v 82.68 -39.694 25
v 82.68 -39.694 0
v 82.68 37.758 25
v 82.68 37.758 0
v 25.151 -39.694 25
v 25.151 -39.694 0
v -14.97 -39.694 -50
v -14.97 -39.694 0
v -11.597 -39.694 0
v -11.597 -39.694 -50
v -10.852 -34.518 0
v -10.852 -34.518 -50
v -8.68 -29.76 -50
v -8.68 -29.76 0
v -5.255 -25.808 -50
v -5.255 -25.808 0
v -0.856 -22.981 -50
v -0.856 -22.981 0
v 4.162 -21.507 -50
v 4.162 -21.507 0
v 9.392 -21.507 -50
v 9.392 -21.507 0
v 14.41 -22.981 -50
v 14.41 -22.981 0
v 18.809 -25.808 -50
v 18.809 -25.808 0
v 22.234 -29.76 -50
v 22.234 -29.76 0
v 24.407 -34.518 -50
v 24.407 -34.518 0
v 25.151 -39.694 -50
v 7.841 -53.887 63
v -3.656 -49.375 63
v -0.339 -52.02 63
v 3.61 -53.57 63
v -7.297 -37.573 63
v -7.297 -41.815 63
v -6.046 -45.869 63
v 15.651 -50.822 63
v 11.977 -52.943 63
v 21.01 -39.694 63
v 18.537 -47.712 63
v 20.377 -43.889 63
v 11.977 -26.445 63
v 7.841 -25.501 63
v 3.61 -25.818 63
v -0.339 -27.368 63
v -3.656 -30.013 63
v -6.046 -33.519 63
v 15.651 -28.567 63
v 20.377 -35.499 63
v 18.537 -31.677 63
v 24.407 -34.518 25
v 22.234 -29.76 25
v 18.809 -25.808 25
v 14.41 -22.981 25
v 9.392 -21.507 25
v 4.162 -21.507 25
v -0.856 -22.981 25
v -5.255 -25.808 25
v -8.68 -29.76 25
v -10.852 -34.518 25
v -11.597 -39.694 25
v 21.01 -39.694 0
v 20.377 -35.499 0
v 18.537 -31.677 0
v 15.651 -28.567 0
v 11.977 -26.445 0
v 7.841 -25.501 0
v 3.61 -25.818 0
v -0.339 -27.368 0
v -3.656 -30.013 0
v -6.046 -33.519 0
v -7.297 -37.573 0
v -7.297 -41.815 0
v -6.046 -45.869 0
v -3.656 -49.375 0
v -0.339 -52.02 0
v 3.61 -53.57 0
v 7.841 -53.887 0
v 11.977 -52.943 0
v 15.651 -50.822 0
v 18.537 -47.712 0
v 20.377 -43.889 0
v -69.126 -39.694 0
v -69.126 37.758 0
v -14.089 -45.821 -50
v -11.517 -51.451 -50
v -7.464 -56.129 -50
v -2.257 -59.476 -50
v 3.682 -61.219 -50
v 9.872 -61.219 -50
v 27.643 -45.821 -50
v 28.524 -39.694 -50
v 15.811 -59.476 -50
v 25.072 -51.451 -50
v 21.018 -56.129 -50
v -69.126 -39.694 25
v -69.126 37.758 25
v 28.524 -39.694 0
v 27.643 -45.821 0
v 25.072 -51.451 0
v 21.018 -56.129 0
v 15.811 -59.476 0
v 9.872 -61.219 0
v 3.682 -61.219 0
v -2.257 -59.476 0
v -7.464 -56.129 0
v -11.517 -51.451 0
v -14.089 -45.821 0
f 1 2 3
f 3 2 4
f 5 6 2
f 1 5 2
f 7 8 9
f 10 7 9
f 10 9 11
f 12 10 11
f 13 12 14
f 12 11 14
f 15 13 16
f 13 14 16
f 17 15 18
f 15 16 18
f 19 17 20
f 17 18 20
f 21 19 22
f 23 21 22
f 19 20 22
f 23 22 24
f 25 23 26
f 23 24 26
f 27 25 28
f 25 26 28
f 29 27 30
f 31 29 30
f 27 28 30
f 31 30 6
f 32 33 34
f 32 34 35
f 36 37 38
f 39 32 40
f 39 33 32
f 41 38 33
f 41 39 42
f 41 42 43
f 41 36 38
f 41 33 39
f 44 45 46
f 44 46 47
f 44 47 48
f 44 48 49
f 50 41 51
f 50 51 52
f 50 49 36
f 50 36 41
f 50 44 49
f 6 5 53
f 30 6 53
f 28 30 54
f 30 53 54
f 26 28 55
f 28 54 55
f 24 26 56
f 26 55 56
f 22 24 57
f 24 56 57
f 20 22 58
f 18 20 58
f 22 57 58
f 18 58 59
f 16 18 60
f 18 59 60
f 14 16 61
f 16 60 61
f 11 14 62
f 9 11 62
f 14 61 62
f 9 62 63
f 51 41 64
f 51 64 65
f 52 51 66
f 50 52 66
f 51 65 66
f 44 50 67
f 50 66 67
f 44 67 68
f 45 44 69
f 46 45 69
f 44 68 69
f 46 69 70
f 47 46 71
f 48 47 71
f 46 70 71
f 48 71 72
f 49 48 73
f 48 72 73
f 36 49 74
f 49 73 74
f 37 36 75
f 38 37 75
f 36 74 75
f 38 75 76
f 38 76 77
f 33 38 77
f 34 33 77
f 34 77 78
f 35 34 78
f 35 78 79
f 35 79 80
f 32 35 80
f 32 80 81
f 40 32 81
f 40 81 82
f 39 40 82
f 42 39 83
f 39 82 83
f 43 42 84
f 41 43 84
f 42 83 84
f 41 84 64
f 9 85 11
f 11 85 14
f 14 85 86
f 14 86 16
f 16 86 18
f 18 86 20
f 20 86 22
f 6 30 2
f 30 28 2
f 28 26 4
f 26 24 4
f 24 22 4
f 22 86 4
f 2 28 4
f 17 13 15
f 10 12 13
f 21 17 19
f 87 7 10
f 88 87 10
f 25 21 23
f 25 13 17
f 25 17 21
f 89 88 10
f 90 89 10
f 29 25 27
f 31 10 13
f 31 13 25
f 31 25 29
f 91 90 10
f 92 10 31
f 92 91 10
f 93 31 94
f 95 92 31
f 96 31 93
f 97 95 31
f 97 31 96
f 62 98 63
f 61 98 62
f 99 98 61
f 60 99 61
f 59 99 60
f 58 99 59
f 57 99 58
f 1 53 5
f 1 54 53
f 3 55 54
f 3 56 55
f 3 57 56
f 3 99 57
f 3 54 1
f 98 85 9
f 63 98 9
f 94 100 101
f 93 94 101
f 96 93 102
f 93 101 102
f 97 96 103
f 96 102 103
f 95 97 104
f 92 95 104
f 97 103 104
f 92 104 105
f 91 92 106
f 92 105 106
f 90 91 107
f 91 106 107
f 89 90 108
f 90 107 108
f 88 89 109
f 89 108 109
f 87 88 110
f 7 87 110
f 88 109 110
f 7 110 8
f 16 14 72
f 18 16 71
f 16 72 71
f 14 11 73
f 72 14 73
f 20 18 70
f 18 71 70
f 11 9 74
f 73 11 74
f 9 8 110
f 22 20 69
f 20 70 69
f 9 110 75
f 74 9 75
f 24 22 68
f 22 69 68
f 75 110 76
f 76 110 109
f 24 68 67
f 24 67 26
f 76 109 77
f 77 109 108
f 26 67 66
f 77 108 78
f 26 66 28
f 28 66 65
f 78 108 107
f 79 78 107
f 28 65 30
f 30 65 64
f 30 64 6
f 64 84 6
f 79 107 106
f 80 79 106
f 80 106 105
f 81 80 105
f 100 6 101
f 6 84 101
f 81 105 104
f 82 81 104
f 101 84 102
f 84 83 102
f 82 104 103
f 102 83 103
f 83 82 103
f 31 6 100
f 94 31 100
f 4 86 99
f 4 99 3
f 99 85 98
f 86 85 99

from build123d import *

# Parameters (mm, degrees)
F0_W     = 151.8057435751
F0_H     = 77.4519108236
F1_DEPTH = 25
F3_DEPTH = 25
F4_R     = 15.359977329
F5_DEPTH = 50
F6_R     = 14.2326136312
F7_DEPTH = 63


with BuildPart() as f1:
    # F0 (on Top) → F1 (new body)
    with BuildSketch(Plane.XY):
        with Locations((6.7770406604, -0.9681414813)):
            Rectangle(F0_W, F0_H)
    extrude(amount=F1_DEPTH)

    # F2 (on face) → F3 (cut)
    with BuildSketch(Plane.XY.offset(25)):
        with BuildLine():
            Line((-11.5967069719, -39.6940968931), (25.1507882926, -39.6940968931))
            ThreePointArc((25.1507882926, -39.6940968931), (6.7770406604, -21.3203492608), (-11.5967069719, -39.6940968931))
        make_face()
    extrude(amount=-F3_DEPTH, mode=Mode.SUBTRACT)


with BuildPart() as f5:
    # F4 (on face) → F5 (new body)
    with BuildSketch(Plane(origin=(0, 0, 0), x_dir=(1, 0, 0), z_dir=(0, 0, -1))):
        with BuildLine():
            Line((25.1507882926, 39.6940968931), (28.5237095795, 39.6940968931))
            ThreePointArc((28.5237095795, 39.6940968931), (6.7770406604, 61.4407658122), (-14.9696282588, 39.6940968931))
            Line((-14.9696282588, 39.6940968931), (-11.5967069719, 39.6940968931))
            ThreePointArc((-11.5967069719, 39.6940968931), (6.7770406604, 21.3203492608), (25.1507882926, 39.6940968931))
        make_face()
        with Locations((6.7770406604, 39.6940968931)):
            Circle(F4_R, mode=Mode.SUBTRACT)
        with Locations((6.7770406604, 39.6940968931)):
            Circle(F4_R)
    extrude(amount=F5_DEPTH)

    # F6 (on face) → F7 (join)
    with BuildSketch(Plane.XY):
        with Locations((6.7770406604, -39.6940968931)):
            Circle(F6_R)
    extrude(amount=F7_DEPTH)


solid = Compound([f1.part, f5.part])
